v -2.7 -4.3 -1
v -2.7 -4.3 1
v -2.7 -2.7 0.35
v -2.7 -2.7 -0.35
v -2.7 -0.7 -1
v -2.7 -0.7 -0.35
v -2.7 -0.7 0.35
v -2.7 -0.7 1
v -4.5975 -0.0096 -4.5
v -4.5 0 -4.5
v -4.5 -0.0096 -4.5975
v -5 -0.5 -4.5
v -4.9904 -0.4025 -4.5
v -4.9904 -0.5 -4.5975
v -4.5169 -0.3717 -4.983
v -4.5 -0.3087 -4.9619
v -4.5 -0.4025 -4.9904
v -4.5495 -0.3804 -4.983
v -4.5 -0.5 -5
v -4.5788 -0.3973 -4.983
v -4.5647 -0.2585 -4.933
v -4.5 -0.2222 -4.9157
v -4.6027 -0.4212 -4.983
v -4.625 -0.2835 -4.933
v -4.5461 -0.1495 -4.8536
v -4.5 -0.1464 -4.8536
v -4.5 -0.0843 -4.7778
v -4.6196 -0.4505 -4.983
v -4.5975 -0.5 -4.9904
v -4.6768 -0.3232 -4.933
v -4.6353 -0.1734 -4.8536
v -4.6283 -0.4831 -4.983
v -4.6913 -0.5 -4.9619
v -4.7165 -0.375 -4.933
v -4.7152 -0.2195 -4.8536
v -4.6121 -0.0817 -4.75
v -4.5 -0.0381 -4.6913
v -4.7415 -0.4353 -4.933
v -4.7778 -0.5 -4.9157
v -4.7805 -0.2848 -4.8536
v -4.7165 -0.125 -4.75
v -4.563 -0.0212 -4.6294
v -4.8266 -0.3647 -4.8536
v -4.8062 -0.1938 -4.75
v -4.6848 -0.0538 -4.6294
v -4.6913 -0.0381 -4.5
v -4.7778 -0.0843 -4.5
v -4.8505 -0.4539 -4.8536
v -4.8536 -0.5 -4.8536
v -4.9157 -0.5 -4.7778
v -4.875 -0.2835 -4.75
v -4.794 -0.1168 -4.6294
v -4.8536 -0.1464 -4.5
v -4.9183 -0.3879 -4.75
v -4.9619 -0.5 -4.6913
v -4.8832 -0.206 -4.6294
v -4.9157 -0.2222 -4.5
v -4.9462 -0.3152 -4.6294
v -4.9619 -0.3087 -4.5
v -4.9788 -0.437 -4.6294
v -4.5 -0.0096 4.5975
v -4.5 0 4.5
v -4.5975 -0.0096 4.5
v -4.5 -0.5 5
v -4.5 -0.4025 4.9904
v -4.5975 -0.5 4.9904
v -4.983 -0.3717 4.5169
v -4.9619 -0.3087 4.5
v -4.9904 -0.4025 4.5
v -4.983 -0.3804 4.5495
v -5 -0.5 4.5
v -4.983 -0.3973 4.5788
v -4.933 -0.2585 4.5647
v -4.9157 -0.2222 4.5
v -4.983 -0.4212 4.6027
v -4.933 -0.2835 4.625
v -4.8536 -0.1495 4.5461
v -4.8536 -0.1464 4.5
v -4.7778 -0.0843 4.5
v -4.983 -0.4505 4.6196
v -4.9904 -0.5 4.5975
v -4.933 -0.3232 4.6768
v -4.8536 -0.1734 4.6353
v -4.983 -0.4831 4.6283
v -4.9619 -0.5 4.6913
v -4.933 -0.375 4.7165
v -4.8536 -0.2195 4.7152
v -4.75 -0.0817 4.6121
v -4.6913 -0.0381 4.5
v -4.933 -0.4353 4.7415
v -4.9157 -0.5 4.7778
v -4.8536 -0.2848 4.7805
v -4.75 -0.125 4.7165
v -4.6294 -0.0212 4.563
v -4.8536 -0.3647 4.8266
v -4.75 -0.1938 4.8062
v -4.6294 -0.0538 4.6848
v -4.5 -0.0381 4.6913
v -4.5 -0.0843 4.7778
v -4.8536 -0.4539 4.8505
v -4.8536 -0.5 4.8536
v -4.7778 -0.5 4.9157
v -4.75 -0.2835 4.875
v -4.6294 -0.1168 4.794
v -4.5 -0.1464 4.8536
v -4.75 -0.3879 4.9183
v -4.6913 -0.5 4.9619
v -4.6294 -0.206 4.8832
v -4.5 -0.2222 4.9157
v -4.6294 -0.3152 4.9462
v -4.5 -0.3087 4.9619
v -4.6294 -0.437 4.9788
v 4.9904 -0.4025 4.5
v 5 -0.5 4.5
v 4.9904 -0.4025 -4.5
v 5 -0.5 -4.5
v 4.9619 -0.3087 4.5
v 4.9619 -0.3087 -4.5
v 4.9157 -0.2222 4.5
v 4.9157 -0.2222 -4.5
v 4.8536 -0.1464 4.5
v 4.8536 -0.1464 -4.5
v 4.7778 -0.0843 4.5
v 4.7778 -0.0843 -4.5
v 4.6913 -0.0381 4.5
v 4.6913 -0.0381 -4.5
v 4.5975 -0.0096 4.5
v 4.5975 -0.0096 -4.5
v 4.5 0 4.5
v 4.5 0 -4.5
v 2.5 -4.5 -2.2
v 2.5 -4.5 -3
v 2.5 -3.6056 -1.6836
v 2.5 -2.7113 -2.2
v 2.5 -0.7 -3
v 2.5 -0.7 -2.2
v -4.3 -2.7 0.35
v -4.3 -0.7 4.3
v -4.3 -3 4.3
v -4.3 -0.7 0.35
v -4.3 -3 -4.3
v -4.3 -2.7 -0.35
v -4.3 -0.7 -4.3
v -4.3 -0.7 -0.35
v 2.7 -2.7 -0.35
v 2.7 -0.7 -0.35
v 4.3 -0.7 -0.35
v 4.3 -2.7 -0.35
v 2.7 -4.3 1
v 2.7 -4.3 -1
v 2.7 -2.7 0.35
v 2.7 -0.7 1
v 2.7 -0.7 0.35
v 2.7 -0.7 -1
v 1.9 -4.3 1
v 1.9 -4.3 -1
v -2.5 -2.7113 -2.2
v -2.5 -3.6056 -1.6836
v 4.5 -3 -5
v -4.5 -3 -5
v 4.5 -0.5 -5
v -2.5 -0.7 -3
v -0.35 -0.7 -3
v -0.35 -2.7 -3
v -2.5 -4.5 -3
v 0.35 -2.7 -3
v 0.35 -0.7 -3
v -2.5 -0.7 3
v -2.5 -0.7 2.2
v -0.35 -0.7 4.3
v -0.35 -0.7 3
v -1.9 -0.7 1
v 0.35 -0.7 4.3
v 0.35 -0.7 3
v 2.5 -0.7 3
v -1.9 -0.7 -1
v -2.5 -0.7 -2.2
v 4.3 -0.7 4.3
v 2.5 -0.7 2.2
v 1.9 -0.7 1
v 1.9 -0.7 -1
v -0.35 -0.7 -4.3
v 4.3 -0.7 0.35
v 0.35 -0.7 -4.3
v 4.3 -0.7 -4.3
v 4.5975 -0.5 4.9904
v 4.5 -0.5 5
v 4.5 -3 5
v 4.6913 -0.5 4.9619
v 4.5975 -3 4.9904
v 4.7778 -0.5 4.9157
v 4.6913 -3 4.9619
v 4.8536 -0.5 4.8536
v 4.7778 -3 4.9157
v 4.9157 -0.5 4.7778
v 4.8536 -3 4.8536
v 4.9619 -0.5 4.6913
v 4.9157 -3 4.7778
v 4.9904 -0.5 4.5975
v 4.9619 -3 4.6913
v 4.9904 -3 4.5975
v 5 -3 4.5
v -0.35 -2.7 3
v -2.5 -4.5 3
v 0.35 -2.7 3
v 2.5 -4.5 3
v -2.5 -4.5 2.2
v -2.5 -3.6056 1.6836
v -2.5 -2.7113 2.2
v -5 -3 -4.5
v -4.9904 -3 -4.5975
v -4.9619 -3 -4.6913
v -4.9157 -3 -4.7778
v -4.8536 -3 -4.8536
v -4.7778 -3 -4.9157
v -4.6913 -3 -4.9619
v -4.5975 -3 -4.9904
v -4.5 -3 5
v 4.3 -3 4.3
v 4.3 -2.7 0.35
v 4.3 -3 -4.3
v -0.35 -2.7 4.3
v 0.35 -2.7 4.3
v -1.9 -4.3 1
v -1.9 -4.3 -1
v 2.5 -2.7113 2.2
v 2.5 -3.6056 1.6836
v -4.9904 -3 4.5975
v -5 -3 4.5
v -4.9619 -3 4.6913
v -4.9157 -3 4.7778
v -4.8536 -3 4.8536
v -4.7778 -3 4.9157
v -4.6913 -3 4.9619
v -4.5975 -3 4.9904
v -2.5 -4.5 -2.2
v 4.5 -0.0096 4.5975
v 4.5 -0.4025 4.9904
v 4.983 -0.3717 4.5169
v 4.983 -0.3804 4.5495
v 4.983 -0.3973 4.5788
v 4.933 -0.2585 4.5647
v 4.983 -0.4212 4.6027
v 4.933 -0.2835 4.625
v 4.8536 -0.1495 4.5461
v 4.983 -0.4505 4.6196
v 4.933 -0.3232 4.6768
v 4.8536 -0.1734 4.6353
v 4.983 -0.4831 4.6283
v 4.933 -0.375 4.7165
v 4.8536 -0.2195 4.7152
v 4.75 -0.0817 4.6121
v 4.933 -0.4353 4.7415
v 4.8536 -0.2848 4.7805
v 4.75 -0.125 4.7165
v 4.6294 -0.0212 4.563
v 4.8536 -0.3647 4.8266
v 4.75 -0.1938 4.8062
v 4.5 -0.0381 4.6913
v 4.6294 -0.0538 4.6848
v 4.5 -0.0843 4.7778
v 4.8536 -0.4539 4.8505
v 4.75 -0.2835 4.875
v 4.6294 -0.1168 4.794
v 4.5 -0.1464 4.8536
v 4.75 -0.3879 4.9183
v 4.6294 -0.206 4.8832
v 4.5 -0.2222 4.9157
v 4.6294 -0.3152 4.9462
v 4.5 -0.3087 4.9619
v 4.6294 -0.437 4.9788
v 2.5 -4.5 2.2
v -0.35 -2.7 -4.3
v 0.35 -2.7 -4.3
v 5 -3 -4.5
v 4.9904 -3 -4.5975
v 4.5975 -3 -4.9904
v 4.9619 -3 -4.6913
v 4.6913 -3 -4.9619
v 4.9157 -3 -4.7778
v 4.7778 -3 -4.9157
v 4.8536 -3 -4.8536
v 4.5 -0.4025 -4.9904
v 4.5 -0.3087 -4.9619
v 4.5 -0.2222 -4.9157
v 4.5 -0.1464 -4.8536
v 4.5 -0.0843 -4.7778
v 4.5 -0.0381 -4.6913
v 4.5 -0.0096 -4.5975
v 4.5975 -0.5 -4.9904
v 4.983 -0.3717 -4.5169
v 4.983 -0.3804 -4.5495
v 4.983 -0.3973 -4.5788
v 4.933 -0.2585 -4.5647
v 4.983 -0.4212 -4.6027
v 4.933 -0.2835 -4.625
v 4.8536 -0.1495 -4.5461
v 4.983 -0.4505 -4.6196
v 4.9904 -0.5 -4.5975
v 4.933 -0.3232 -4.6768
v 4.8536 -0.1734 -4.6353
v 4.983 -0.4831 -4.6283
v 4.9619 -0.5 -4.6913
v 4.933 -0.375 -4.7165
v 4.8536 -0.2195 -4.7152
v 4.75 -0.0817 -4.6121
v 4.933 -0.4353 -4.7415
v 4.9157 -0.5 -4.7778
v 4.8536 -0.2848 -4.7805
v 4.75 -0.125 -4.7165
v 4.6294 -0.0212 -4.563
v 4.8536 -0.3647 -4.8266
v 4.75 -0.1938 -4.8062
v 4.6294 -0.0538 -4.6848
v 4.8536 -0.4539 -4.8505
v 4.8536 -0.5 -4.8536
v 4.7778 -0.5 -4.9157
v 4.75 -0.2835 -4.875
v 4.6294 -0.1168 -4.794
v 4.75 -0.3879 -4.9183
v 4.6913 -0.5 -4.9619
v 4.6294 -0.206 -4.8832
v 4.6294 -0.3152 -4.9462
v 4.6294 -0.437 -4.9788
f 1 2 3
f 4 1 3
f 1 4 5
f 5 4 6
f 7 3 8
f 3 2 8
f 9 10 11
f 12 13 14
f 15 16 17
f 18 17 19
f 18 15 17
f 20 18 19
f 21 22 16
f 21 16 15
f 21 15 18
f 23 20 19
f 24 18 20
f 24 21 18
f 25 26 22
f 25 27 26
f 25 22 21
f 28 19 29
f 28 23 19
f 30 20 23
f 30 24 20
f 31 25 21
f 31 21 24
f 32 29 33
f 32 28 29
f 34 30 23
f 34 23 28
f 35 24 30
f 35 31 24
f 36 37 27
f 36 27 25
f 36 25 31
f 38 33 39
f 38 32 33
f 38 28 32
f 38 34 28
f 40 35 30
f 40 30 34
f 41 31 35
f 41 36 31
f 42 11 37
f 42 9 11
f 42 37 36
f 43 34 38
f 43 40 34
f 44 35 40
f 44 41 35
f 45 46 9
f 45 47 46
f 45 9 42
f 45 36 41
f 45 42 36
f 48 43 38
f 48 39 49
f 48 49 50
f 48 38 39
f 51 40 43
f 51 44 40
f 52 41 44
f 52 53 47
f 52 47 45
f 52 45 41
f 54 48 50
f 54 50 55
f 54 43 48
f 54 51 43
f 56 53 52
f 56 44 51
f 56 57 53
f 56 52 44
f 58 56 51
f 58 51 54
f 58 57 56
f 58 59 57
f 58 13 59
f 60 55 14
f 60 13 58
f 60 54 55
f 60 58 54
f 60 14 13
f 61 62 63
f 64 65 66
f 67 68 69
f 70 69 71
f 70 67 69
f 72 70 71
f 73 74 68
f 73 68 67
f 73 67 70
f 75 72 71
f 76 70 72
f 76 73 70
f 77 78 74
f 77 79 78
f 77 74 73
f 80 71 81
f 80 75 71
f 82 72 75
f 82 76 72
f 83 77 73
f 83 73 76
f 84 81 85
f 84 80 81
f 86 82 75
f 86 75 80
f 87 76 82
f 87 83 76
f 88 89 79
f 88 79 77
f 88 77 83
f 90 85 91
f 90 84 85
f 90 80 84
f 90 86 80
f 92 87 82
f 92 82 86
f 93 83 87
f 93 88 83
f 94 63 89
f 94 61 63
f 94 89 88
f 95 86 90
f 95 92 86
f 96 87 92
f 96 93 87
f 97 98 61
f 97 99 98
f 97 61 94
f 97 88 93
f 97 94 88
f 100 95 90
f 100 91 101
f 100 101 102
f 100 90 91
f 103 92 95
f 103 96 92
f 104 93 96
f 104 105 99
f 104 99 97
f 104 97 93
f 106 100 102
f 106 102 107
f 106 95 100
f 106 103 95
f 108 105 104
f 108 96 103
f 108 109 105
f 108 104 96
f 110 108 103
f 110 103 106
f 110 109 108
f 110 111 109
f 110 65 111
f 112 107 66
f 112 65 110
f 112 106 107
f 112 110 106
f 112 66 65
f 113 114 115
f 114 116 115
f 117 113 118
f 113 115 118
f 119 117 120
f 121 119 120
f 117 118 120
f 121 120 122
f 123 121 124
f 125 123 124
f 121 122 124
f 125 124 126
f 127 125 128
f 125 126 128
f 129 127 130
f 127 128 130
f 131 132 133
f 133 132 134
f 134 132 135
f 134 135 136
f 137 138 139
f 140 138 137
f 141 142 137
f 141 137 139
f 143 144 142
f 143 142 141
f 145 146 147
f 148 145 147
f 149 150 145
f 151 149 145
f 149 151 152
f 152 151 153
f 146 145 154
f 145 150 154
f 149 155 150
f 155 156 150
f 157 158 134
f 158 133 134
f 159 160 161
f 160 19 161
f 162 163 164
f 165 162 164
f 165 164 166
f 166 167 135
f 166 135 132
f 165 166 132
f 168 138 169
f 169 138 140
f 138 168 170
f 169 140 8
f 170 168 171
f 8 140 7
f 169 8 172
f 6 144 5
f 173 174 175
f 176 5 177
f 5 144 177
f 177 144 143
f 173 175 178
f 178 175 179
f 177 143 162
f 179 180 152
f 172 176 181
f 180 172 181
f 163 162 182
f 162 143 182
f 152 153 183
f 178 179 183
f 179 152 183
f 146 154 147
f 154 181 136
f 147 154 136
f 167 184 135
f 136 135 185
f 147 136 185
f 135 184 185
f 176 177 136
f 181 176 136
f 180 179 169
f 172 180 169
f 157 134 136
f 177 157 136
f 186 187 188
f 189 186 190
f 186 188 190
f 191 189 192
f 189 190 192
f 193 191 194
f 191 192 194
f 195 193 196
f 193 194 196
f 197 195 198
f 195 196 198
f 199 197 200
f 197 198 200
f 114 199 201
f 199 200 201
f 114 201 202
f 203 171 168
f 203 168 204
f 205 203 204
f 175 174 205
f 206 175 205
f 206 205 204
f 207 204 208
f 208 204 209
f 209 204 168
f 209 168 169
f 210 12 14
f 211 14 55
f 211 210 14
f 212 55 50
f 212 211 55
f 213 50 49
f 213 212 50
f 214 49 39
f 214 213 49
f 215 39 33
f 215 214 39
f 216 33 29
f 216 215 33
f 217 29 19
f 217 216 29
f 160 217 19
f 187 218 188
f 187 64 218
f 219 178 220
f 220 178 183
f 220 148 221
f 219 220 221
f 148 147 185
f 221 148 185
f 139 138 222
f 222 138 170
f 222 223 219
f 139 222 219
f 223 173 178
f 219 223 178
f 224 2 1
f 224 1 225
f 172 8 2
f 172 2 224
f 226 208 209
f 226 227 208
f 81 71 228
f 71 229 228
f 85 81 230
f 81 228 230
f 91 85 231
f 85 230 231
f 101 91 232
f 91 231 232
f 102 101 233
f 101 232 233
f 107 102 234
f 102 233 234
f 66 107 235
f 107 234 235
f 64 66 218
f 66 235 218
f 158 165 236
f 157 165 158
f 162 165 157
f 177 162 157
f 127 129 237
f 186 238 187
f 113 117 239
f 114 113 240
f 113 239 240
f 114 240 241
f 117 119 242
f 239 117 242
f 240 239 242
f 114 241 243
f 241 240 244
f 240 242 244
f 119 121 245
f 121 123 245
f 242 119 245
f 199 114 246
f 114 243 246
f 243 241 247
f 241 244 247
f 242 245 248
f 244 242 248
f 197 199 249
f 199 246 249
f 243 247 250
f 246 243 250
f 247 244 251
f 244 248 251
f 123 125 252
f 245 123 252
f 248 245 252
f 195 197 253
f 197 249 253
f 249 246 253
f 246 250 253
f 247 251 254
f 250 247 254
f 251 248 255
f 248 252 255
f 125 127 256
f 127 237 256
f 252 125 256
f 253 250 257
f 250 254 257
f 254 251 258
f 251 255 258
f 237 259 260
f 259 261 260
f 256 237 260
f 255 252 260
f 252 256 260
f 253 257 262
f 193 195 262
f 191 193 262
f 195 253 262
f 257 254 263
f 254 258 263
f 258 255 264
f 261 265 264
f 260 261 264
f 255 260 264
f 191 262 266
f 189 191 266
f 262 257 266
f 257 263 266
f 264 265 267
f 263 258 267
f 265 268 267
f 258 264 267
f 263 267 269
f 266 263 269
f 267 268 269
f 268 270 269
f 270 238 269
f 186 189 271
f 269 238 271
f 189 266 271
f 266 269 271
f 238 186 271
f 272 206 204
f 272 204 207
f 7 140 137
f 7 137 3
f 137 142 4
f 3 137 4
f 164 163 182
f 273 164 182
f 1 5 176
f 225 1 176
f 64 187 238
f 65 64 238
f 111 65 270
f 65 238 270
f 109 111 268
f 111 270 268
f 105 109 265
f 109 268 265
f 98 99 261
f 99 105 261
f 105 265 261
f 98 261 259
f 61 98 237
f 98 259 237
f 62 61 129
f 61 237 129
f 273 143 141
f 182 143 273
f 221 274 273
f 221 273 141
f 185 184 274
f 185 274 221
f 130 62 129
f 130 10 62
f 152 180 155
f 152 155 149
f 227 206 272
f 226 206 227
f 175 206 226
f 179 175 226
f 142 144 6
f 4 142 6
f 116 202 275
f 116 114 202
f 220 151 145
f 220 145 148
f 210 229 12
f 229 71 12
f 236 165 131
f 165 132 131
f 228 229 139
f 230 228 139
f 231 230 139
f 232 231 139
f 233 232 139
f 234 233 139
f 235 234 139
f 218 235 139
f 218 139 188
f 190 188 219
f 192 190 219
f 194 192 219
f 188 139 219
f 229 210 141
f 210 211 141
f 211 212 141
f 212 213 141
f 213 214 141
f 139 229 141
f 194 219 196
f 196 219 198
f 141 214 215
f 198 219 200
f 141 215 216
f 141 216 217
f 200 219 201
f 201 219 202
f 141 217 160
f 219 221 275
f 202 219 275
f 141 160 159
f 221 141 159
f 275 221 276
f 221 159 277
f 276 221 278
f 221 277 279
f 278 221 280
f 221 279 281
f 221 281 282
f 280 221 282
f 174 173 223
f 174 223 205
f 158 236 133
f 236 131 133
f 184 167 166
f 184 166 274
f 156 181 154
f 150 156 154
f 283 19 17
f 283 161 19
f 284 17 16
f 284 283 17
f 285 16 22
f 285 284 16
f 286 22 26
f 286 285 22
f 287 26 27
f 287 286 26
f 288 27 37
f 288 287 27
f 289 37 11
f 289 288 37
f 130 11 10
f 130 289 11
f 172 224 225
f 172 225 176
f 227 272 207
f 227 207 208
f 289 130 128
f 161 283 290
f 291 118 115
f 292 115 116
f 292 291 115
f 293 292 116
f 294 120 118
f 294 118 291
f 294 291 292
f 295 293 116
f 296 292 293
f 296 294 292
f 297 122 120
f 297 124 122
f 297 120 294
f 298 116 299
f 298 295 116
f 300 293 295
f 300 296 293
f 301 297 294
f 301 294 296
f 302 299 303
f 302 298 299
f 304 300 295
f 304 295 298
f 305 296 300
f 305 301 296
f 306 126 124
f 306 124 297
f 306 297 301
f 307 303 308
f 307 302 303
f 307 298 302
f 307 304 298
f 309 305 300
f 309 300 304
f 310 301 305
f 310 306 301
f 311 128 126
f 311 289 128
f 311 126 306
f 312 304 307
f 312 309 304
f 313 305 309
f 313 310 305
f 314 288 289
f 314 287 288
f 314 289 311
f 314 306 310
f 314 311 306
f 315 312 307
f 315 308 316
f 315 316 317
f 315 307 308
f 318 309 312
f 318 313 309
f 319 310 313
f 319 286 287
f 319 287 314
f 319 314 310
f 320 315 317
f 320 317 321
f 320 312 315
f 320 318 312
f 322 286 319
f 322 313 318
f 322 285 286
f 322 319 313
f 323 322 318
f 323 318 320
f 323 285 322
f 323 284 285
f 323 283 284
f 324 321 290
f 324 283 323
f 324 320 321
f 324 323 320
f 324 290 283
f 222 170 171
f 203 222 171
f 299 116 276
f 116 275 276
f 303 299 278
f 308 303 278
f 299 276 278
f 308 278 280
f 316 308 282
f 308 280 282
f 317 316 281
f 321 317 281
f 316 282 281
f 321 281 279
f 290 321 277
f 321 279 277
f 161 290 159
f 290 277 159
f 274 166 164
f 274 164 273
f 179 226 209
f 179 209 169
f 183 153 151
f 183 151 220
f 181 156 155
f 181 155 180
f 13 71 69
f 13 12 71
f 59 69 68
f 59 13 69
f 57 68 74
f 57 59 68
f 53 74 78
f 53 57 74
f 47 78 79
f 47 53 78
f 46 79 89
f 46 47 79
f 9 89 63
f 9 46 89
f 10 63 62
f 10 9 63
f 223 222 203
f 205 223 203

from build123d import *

# Parameters (mm, degrees)
SKETCH1_W             = 10
SKETCH1_H             = 10
BOSS_EXTRUDE2_DEPTH   = 3
SHELL2_T              = -0.7
FILLET2_R             = 0.5
BOSS_EXTRUDE3_DEPTH   = 2.5
BOSS_EXTRUDE3_2_DEPTH = 2.5
SKETCH6_W             = 0.8
SKETCH6_H             = 3.8
BOSS_EXTRUDE4_DEPTH   = 1
SKETCH7_W             = 1.5
SKETCH7_H             = 2.2
BOSS_EXTRUDE5_DEPTH   = 0.35
SKETCH9_W             = 1.8
SKETCH9_H             = 2.2
BOSS_EXTRUDE6_DEPTH   = 0.35


with BuildPart() as part:
    # Sketch1 → Boss-Extrude2 (new body)
    with BuildSketch(Plane(origin=(0, 0, 0), x_dir=(1, 0, 0), z_dir=(0, 1, 0))):
        Rectangle(SKETCH1_W, SKETCH1_H)
    extrude(amount=-BOSS_EXTRUDE2_DEPTH)

    # Shell2
    shell2_openings = [part.faces().sort_by_distance(p)[0] for p in [
        (0, -3, 0),
    ]]
    offset(amount=SHELL2_T, openings=shell2_openings, kind=Kind.INTERSECTION)

    # Fillet2
    fillet2_edges = [part.edges().sort_by_distance(p)[0] for p in [
        (0, 0, 5),
        (-5, 0, 0),
        (0, 0, -5),
        (5, 0, 0),
        (5, -1.5, 5),
        (-5, -1.5, 5),
        (-5, -1.5, -5),
        (5, -1.5, -5),
    ]]
    fillet(fillet2_edges, radius=FILLET2_R)

    # Sketch6 → Boss-Extrude4 (add, symmetric)
    with BuildSketch(Plane.XY):
        with Locations((2.3, -2.4)):
            Rectangle(SKETCH6_W, SKETCH6_H)
        with Locations((-2.3, -2.4)):
            Rectangle(SKETCH6_W, SKETCH6_H)
    extrude(amount=BOSS_EXTRUDE4_DEPTH, both=True)



with BuildPart() as body_2:
    # Sketch5 → Boss-Extrude3 (new body, symmetric)
    with BuildSketch(Plane(origin=(0, 0, 0), x_dir=(0, 0, -1), z_dir=(1, 0, 0))):
        Polygon((3, -0.5), (3, -4.5), (2.2, -4.5), (1.683643362, -3.605644068), (2.2, -2.711288136), (2.2, -0.5), align=None)
    extrude(amount=BOSS_EXTRUDE3_DEPTH, both=True)


with BuildPart() as body_3:
    # Sketch5 → Boss-Extrude3 2 (new body, symmetric)
    with BuildSketch(Plane(origin=(0, 0, 0), x_dir=(0, 0, -1), z_dir=(1, 0, 0))):
        Polygon((-2.2, -0.5), (-3, -0.5), (-3, -4.5), (-2.2, -4.5), (-1.683643362, -3.605644068), (-2.2, -2.711288136), align=None)
    extrude(amount=BOSS_EXTRUDE3_2_DEPTH, both=True)


with BuildPart() as part_1:
    add(part.part)

    add(body_2.part)  # Boss-Extrude5 merges body 2

    add(body_3.part)  # Boss-Extrude5 merges body 3
    # Sketch7 → Boss-Extrude5 (add, symmetric)
    with BuildSketch(Plane(origin=(0, 0, 0), x_dir=(0, 0, -1), z_dir=(1, 0, 0))):
        with Locations((-3.75, -1.6)):
            Rectangle(SKETCH7_W, SKETCH7_H)
        with Locations((3.75, -1.6)):
            Rectangle(SKETCH7_W, SKETCH7_H)
    extrude(amount=BOSS_EXTRUDE5_DEPTH, both=True)

    # Sketch9 → Boss-Extrude6 (add, symmetric)
    with BuildSketch(Plane.XY):
        with Locations((-3.6, -1.6)):
            Rectangle(SKETCH9_W, SKETCH9_H)
        with Locations((3.6, -1.6)):
            Rectangle(SKETCH9_W, SKETCH9_H)
    extrude(amount=BOSS_EXTRUDE6_DEPTH, both=True)


solid = part_1.part
